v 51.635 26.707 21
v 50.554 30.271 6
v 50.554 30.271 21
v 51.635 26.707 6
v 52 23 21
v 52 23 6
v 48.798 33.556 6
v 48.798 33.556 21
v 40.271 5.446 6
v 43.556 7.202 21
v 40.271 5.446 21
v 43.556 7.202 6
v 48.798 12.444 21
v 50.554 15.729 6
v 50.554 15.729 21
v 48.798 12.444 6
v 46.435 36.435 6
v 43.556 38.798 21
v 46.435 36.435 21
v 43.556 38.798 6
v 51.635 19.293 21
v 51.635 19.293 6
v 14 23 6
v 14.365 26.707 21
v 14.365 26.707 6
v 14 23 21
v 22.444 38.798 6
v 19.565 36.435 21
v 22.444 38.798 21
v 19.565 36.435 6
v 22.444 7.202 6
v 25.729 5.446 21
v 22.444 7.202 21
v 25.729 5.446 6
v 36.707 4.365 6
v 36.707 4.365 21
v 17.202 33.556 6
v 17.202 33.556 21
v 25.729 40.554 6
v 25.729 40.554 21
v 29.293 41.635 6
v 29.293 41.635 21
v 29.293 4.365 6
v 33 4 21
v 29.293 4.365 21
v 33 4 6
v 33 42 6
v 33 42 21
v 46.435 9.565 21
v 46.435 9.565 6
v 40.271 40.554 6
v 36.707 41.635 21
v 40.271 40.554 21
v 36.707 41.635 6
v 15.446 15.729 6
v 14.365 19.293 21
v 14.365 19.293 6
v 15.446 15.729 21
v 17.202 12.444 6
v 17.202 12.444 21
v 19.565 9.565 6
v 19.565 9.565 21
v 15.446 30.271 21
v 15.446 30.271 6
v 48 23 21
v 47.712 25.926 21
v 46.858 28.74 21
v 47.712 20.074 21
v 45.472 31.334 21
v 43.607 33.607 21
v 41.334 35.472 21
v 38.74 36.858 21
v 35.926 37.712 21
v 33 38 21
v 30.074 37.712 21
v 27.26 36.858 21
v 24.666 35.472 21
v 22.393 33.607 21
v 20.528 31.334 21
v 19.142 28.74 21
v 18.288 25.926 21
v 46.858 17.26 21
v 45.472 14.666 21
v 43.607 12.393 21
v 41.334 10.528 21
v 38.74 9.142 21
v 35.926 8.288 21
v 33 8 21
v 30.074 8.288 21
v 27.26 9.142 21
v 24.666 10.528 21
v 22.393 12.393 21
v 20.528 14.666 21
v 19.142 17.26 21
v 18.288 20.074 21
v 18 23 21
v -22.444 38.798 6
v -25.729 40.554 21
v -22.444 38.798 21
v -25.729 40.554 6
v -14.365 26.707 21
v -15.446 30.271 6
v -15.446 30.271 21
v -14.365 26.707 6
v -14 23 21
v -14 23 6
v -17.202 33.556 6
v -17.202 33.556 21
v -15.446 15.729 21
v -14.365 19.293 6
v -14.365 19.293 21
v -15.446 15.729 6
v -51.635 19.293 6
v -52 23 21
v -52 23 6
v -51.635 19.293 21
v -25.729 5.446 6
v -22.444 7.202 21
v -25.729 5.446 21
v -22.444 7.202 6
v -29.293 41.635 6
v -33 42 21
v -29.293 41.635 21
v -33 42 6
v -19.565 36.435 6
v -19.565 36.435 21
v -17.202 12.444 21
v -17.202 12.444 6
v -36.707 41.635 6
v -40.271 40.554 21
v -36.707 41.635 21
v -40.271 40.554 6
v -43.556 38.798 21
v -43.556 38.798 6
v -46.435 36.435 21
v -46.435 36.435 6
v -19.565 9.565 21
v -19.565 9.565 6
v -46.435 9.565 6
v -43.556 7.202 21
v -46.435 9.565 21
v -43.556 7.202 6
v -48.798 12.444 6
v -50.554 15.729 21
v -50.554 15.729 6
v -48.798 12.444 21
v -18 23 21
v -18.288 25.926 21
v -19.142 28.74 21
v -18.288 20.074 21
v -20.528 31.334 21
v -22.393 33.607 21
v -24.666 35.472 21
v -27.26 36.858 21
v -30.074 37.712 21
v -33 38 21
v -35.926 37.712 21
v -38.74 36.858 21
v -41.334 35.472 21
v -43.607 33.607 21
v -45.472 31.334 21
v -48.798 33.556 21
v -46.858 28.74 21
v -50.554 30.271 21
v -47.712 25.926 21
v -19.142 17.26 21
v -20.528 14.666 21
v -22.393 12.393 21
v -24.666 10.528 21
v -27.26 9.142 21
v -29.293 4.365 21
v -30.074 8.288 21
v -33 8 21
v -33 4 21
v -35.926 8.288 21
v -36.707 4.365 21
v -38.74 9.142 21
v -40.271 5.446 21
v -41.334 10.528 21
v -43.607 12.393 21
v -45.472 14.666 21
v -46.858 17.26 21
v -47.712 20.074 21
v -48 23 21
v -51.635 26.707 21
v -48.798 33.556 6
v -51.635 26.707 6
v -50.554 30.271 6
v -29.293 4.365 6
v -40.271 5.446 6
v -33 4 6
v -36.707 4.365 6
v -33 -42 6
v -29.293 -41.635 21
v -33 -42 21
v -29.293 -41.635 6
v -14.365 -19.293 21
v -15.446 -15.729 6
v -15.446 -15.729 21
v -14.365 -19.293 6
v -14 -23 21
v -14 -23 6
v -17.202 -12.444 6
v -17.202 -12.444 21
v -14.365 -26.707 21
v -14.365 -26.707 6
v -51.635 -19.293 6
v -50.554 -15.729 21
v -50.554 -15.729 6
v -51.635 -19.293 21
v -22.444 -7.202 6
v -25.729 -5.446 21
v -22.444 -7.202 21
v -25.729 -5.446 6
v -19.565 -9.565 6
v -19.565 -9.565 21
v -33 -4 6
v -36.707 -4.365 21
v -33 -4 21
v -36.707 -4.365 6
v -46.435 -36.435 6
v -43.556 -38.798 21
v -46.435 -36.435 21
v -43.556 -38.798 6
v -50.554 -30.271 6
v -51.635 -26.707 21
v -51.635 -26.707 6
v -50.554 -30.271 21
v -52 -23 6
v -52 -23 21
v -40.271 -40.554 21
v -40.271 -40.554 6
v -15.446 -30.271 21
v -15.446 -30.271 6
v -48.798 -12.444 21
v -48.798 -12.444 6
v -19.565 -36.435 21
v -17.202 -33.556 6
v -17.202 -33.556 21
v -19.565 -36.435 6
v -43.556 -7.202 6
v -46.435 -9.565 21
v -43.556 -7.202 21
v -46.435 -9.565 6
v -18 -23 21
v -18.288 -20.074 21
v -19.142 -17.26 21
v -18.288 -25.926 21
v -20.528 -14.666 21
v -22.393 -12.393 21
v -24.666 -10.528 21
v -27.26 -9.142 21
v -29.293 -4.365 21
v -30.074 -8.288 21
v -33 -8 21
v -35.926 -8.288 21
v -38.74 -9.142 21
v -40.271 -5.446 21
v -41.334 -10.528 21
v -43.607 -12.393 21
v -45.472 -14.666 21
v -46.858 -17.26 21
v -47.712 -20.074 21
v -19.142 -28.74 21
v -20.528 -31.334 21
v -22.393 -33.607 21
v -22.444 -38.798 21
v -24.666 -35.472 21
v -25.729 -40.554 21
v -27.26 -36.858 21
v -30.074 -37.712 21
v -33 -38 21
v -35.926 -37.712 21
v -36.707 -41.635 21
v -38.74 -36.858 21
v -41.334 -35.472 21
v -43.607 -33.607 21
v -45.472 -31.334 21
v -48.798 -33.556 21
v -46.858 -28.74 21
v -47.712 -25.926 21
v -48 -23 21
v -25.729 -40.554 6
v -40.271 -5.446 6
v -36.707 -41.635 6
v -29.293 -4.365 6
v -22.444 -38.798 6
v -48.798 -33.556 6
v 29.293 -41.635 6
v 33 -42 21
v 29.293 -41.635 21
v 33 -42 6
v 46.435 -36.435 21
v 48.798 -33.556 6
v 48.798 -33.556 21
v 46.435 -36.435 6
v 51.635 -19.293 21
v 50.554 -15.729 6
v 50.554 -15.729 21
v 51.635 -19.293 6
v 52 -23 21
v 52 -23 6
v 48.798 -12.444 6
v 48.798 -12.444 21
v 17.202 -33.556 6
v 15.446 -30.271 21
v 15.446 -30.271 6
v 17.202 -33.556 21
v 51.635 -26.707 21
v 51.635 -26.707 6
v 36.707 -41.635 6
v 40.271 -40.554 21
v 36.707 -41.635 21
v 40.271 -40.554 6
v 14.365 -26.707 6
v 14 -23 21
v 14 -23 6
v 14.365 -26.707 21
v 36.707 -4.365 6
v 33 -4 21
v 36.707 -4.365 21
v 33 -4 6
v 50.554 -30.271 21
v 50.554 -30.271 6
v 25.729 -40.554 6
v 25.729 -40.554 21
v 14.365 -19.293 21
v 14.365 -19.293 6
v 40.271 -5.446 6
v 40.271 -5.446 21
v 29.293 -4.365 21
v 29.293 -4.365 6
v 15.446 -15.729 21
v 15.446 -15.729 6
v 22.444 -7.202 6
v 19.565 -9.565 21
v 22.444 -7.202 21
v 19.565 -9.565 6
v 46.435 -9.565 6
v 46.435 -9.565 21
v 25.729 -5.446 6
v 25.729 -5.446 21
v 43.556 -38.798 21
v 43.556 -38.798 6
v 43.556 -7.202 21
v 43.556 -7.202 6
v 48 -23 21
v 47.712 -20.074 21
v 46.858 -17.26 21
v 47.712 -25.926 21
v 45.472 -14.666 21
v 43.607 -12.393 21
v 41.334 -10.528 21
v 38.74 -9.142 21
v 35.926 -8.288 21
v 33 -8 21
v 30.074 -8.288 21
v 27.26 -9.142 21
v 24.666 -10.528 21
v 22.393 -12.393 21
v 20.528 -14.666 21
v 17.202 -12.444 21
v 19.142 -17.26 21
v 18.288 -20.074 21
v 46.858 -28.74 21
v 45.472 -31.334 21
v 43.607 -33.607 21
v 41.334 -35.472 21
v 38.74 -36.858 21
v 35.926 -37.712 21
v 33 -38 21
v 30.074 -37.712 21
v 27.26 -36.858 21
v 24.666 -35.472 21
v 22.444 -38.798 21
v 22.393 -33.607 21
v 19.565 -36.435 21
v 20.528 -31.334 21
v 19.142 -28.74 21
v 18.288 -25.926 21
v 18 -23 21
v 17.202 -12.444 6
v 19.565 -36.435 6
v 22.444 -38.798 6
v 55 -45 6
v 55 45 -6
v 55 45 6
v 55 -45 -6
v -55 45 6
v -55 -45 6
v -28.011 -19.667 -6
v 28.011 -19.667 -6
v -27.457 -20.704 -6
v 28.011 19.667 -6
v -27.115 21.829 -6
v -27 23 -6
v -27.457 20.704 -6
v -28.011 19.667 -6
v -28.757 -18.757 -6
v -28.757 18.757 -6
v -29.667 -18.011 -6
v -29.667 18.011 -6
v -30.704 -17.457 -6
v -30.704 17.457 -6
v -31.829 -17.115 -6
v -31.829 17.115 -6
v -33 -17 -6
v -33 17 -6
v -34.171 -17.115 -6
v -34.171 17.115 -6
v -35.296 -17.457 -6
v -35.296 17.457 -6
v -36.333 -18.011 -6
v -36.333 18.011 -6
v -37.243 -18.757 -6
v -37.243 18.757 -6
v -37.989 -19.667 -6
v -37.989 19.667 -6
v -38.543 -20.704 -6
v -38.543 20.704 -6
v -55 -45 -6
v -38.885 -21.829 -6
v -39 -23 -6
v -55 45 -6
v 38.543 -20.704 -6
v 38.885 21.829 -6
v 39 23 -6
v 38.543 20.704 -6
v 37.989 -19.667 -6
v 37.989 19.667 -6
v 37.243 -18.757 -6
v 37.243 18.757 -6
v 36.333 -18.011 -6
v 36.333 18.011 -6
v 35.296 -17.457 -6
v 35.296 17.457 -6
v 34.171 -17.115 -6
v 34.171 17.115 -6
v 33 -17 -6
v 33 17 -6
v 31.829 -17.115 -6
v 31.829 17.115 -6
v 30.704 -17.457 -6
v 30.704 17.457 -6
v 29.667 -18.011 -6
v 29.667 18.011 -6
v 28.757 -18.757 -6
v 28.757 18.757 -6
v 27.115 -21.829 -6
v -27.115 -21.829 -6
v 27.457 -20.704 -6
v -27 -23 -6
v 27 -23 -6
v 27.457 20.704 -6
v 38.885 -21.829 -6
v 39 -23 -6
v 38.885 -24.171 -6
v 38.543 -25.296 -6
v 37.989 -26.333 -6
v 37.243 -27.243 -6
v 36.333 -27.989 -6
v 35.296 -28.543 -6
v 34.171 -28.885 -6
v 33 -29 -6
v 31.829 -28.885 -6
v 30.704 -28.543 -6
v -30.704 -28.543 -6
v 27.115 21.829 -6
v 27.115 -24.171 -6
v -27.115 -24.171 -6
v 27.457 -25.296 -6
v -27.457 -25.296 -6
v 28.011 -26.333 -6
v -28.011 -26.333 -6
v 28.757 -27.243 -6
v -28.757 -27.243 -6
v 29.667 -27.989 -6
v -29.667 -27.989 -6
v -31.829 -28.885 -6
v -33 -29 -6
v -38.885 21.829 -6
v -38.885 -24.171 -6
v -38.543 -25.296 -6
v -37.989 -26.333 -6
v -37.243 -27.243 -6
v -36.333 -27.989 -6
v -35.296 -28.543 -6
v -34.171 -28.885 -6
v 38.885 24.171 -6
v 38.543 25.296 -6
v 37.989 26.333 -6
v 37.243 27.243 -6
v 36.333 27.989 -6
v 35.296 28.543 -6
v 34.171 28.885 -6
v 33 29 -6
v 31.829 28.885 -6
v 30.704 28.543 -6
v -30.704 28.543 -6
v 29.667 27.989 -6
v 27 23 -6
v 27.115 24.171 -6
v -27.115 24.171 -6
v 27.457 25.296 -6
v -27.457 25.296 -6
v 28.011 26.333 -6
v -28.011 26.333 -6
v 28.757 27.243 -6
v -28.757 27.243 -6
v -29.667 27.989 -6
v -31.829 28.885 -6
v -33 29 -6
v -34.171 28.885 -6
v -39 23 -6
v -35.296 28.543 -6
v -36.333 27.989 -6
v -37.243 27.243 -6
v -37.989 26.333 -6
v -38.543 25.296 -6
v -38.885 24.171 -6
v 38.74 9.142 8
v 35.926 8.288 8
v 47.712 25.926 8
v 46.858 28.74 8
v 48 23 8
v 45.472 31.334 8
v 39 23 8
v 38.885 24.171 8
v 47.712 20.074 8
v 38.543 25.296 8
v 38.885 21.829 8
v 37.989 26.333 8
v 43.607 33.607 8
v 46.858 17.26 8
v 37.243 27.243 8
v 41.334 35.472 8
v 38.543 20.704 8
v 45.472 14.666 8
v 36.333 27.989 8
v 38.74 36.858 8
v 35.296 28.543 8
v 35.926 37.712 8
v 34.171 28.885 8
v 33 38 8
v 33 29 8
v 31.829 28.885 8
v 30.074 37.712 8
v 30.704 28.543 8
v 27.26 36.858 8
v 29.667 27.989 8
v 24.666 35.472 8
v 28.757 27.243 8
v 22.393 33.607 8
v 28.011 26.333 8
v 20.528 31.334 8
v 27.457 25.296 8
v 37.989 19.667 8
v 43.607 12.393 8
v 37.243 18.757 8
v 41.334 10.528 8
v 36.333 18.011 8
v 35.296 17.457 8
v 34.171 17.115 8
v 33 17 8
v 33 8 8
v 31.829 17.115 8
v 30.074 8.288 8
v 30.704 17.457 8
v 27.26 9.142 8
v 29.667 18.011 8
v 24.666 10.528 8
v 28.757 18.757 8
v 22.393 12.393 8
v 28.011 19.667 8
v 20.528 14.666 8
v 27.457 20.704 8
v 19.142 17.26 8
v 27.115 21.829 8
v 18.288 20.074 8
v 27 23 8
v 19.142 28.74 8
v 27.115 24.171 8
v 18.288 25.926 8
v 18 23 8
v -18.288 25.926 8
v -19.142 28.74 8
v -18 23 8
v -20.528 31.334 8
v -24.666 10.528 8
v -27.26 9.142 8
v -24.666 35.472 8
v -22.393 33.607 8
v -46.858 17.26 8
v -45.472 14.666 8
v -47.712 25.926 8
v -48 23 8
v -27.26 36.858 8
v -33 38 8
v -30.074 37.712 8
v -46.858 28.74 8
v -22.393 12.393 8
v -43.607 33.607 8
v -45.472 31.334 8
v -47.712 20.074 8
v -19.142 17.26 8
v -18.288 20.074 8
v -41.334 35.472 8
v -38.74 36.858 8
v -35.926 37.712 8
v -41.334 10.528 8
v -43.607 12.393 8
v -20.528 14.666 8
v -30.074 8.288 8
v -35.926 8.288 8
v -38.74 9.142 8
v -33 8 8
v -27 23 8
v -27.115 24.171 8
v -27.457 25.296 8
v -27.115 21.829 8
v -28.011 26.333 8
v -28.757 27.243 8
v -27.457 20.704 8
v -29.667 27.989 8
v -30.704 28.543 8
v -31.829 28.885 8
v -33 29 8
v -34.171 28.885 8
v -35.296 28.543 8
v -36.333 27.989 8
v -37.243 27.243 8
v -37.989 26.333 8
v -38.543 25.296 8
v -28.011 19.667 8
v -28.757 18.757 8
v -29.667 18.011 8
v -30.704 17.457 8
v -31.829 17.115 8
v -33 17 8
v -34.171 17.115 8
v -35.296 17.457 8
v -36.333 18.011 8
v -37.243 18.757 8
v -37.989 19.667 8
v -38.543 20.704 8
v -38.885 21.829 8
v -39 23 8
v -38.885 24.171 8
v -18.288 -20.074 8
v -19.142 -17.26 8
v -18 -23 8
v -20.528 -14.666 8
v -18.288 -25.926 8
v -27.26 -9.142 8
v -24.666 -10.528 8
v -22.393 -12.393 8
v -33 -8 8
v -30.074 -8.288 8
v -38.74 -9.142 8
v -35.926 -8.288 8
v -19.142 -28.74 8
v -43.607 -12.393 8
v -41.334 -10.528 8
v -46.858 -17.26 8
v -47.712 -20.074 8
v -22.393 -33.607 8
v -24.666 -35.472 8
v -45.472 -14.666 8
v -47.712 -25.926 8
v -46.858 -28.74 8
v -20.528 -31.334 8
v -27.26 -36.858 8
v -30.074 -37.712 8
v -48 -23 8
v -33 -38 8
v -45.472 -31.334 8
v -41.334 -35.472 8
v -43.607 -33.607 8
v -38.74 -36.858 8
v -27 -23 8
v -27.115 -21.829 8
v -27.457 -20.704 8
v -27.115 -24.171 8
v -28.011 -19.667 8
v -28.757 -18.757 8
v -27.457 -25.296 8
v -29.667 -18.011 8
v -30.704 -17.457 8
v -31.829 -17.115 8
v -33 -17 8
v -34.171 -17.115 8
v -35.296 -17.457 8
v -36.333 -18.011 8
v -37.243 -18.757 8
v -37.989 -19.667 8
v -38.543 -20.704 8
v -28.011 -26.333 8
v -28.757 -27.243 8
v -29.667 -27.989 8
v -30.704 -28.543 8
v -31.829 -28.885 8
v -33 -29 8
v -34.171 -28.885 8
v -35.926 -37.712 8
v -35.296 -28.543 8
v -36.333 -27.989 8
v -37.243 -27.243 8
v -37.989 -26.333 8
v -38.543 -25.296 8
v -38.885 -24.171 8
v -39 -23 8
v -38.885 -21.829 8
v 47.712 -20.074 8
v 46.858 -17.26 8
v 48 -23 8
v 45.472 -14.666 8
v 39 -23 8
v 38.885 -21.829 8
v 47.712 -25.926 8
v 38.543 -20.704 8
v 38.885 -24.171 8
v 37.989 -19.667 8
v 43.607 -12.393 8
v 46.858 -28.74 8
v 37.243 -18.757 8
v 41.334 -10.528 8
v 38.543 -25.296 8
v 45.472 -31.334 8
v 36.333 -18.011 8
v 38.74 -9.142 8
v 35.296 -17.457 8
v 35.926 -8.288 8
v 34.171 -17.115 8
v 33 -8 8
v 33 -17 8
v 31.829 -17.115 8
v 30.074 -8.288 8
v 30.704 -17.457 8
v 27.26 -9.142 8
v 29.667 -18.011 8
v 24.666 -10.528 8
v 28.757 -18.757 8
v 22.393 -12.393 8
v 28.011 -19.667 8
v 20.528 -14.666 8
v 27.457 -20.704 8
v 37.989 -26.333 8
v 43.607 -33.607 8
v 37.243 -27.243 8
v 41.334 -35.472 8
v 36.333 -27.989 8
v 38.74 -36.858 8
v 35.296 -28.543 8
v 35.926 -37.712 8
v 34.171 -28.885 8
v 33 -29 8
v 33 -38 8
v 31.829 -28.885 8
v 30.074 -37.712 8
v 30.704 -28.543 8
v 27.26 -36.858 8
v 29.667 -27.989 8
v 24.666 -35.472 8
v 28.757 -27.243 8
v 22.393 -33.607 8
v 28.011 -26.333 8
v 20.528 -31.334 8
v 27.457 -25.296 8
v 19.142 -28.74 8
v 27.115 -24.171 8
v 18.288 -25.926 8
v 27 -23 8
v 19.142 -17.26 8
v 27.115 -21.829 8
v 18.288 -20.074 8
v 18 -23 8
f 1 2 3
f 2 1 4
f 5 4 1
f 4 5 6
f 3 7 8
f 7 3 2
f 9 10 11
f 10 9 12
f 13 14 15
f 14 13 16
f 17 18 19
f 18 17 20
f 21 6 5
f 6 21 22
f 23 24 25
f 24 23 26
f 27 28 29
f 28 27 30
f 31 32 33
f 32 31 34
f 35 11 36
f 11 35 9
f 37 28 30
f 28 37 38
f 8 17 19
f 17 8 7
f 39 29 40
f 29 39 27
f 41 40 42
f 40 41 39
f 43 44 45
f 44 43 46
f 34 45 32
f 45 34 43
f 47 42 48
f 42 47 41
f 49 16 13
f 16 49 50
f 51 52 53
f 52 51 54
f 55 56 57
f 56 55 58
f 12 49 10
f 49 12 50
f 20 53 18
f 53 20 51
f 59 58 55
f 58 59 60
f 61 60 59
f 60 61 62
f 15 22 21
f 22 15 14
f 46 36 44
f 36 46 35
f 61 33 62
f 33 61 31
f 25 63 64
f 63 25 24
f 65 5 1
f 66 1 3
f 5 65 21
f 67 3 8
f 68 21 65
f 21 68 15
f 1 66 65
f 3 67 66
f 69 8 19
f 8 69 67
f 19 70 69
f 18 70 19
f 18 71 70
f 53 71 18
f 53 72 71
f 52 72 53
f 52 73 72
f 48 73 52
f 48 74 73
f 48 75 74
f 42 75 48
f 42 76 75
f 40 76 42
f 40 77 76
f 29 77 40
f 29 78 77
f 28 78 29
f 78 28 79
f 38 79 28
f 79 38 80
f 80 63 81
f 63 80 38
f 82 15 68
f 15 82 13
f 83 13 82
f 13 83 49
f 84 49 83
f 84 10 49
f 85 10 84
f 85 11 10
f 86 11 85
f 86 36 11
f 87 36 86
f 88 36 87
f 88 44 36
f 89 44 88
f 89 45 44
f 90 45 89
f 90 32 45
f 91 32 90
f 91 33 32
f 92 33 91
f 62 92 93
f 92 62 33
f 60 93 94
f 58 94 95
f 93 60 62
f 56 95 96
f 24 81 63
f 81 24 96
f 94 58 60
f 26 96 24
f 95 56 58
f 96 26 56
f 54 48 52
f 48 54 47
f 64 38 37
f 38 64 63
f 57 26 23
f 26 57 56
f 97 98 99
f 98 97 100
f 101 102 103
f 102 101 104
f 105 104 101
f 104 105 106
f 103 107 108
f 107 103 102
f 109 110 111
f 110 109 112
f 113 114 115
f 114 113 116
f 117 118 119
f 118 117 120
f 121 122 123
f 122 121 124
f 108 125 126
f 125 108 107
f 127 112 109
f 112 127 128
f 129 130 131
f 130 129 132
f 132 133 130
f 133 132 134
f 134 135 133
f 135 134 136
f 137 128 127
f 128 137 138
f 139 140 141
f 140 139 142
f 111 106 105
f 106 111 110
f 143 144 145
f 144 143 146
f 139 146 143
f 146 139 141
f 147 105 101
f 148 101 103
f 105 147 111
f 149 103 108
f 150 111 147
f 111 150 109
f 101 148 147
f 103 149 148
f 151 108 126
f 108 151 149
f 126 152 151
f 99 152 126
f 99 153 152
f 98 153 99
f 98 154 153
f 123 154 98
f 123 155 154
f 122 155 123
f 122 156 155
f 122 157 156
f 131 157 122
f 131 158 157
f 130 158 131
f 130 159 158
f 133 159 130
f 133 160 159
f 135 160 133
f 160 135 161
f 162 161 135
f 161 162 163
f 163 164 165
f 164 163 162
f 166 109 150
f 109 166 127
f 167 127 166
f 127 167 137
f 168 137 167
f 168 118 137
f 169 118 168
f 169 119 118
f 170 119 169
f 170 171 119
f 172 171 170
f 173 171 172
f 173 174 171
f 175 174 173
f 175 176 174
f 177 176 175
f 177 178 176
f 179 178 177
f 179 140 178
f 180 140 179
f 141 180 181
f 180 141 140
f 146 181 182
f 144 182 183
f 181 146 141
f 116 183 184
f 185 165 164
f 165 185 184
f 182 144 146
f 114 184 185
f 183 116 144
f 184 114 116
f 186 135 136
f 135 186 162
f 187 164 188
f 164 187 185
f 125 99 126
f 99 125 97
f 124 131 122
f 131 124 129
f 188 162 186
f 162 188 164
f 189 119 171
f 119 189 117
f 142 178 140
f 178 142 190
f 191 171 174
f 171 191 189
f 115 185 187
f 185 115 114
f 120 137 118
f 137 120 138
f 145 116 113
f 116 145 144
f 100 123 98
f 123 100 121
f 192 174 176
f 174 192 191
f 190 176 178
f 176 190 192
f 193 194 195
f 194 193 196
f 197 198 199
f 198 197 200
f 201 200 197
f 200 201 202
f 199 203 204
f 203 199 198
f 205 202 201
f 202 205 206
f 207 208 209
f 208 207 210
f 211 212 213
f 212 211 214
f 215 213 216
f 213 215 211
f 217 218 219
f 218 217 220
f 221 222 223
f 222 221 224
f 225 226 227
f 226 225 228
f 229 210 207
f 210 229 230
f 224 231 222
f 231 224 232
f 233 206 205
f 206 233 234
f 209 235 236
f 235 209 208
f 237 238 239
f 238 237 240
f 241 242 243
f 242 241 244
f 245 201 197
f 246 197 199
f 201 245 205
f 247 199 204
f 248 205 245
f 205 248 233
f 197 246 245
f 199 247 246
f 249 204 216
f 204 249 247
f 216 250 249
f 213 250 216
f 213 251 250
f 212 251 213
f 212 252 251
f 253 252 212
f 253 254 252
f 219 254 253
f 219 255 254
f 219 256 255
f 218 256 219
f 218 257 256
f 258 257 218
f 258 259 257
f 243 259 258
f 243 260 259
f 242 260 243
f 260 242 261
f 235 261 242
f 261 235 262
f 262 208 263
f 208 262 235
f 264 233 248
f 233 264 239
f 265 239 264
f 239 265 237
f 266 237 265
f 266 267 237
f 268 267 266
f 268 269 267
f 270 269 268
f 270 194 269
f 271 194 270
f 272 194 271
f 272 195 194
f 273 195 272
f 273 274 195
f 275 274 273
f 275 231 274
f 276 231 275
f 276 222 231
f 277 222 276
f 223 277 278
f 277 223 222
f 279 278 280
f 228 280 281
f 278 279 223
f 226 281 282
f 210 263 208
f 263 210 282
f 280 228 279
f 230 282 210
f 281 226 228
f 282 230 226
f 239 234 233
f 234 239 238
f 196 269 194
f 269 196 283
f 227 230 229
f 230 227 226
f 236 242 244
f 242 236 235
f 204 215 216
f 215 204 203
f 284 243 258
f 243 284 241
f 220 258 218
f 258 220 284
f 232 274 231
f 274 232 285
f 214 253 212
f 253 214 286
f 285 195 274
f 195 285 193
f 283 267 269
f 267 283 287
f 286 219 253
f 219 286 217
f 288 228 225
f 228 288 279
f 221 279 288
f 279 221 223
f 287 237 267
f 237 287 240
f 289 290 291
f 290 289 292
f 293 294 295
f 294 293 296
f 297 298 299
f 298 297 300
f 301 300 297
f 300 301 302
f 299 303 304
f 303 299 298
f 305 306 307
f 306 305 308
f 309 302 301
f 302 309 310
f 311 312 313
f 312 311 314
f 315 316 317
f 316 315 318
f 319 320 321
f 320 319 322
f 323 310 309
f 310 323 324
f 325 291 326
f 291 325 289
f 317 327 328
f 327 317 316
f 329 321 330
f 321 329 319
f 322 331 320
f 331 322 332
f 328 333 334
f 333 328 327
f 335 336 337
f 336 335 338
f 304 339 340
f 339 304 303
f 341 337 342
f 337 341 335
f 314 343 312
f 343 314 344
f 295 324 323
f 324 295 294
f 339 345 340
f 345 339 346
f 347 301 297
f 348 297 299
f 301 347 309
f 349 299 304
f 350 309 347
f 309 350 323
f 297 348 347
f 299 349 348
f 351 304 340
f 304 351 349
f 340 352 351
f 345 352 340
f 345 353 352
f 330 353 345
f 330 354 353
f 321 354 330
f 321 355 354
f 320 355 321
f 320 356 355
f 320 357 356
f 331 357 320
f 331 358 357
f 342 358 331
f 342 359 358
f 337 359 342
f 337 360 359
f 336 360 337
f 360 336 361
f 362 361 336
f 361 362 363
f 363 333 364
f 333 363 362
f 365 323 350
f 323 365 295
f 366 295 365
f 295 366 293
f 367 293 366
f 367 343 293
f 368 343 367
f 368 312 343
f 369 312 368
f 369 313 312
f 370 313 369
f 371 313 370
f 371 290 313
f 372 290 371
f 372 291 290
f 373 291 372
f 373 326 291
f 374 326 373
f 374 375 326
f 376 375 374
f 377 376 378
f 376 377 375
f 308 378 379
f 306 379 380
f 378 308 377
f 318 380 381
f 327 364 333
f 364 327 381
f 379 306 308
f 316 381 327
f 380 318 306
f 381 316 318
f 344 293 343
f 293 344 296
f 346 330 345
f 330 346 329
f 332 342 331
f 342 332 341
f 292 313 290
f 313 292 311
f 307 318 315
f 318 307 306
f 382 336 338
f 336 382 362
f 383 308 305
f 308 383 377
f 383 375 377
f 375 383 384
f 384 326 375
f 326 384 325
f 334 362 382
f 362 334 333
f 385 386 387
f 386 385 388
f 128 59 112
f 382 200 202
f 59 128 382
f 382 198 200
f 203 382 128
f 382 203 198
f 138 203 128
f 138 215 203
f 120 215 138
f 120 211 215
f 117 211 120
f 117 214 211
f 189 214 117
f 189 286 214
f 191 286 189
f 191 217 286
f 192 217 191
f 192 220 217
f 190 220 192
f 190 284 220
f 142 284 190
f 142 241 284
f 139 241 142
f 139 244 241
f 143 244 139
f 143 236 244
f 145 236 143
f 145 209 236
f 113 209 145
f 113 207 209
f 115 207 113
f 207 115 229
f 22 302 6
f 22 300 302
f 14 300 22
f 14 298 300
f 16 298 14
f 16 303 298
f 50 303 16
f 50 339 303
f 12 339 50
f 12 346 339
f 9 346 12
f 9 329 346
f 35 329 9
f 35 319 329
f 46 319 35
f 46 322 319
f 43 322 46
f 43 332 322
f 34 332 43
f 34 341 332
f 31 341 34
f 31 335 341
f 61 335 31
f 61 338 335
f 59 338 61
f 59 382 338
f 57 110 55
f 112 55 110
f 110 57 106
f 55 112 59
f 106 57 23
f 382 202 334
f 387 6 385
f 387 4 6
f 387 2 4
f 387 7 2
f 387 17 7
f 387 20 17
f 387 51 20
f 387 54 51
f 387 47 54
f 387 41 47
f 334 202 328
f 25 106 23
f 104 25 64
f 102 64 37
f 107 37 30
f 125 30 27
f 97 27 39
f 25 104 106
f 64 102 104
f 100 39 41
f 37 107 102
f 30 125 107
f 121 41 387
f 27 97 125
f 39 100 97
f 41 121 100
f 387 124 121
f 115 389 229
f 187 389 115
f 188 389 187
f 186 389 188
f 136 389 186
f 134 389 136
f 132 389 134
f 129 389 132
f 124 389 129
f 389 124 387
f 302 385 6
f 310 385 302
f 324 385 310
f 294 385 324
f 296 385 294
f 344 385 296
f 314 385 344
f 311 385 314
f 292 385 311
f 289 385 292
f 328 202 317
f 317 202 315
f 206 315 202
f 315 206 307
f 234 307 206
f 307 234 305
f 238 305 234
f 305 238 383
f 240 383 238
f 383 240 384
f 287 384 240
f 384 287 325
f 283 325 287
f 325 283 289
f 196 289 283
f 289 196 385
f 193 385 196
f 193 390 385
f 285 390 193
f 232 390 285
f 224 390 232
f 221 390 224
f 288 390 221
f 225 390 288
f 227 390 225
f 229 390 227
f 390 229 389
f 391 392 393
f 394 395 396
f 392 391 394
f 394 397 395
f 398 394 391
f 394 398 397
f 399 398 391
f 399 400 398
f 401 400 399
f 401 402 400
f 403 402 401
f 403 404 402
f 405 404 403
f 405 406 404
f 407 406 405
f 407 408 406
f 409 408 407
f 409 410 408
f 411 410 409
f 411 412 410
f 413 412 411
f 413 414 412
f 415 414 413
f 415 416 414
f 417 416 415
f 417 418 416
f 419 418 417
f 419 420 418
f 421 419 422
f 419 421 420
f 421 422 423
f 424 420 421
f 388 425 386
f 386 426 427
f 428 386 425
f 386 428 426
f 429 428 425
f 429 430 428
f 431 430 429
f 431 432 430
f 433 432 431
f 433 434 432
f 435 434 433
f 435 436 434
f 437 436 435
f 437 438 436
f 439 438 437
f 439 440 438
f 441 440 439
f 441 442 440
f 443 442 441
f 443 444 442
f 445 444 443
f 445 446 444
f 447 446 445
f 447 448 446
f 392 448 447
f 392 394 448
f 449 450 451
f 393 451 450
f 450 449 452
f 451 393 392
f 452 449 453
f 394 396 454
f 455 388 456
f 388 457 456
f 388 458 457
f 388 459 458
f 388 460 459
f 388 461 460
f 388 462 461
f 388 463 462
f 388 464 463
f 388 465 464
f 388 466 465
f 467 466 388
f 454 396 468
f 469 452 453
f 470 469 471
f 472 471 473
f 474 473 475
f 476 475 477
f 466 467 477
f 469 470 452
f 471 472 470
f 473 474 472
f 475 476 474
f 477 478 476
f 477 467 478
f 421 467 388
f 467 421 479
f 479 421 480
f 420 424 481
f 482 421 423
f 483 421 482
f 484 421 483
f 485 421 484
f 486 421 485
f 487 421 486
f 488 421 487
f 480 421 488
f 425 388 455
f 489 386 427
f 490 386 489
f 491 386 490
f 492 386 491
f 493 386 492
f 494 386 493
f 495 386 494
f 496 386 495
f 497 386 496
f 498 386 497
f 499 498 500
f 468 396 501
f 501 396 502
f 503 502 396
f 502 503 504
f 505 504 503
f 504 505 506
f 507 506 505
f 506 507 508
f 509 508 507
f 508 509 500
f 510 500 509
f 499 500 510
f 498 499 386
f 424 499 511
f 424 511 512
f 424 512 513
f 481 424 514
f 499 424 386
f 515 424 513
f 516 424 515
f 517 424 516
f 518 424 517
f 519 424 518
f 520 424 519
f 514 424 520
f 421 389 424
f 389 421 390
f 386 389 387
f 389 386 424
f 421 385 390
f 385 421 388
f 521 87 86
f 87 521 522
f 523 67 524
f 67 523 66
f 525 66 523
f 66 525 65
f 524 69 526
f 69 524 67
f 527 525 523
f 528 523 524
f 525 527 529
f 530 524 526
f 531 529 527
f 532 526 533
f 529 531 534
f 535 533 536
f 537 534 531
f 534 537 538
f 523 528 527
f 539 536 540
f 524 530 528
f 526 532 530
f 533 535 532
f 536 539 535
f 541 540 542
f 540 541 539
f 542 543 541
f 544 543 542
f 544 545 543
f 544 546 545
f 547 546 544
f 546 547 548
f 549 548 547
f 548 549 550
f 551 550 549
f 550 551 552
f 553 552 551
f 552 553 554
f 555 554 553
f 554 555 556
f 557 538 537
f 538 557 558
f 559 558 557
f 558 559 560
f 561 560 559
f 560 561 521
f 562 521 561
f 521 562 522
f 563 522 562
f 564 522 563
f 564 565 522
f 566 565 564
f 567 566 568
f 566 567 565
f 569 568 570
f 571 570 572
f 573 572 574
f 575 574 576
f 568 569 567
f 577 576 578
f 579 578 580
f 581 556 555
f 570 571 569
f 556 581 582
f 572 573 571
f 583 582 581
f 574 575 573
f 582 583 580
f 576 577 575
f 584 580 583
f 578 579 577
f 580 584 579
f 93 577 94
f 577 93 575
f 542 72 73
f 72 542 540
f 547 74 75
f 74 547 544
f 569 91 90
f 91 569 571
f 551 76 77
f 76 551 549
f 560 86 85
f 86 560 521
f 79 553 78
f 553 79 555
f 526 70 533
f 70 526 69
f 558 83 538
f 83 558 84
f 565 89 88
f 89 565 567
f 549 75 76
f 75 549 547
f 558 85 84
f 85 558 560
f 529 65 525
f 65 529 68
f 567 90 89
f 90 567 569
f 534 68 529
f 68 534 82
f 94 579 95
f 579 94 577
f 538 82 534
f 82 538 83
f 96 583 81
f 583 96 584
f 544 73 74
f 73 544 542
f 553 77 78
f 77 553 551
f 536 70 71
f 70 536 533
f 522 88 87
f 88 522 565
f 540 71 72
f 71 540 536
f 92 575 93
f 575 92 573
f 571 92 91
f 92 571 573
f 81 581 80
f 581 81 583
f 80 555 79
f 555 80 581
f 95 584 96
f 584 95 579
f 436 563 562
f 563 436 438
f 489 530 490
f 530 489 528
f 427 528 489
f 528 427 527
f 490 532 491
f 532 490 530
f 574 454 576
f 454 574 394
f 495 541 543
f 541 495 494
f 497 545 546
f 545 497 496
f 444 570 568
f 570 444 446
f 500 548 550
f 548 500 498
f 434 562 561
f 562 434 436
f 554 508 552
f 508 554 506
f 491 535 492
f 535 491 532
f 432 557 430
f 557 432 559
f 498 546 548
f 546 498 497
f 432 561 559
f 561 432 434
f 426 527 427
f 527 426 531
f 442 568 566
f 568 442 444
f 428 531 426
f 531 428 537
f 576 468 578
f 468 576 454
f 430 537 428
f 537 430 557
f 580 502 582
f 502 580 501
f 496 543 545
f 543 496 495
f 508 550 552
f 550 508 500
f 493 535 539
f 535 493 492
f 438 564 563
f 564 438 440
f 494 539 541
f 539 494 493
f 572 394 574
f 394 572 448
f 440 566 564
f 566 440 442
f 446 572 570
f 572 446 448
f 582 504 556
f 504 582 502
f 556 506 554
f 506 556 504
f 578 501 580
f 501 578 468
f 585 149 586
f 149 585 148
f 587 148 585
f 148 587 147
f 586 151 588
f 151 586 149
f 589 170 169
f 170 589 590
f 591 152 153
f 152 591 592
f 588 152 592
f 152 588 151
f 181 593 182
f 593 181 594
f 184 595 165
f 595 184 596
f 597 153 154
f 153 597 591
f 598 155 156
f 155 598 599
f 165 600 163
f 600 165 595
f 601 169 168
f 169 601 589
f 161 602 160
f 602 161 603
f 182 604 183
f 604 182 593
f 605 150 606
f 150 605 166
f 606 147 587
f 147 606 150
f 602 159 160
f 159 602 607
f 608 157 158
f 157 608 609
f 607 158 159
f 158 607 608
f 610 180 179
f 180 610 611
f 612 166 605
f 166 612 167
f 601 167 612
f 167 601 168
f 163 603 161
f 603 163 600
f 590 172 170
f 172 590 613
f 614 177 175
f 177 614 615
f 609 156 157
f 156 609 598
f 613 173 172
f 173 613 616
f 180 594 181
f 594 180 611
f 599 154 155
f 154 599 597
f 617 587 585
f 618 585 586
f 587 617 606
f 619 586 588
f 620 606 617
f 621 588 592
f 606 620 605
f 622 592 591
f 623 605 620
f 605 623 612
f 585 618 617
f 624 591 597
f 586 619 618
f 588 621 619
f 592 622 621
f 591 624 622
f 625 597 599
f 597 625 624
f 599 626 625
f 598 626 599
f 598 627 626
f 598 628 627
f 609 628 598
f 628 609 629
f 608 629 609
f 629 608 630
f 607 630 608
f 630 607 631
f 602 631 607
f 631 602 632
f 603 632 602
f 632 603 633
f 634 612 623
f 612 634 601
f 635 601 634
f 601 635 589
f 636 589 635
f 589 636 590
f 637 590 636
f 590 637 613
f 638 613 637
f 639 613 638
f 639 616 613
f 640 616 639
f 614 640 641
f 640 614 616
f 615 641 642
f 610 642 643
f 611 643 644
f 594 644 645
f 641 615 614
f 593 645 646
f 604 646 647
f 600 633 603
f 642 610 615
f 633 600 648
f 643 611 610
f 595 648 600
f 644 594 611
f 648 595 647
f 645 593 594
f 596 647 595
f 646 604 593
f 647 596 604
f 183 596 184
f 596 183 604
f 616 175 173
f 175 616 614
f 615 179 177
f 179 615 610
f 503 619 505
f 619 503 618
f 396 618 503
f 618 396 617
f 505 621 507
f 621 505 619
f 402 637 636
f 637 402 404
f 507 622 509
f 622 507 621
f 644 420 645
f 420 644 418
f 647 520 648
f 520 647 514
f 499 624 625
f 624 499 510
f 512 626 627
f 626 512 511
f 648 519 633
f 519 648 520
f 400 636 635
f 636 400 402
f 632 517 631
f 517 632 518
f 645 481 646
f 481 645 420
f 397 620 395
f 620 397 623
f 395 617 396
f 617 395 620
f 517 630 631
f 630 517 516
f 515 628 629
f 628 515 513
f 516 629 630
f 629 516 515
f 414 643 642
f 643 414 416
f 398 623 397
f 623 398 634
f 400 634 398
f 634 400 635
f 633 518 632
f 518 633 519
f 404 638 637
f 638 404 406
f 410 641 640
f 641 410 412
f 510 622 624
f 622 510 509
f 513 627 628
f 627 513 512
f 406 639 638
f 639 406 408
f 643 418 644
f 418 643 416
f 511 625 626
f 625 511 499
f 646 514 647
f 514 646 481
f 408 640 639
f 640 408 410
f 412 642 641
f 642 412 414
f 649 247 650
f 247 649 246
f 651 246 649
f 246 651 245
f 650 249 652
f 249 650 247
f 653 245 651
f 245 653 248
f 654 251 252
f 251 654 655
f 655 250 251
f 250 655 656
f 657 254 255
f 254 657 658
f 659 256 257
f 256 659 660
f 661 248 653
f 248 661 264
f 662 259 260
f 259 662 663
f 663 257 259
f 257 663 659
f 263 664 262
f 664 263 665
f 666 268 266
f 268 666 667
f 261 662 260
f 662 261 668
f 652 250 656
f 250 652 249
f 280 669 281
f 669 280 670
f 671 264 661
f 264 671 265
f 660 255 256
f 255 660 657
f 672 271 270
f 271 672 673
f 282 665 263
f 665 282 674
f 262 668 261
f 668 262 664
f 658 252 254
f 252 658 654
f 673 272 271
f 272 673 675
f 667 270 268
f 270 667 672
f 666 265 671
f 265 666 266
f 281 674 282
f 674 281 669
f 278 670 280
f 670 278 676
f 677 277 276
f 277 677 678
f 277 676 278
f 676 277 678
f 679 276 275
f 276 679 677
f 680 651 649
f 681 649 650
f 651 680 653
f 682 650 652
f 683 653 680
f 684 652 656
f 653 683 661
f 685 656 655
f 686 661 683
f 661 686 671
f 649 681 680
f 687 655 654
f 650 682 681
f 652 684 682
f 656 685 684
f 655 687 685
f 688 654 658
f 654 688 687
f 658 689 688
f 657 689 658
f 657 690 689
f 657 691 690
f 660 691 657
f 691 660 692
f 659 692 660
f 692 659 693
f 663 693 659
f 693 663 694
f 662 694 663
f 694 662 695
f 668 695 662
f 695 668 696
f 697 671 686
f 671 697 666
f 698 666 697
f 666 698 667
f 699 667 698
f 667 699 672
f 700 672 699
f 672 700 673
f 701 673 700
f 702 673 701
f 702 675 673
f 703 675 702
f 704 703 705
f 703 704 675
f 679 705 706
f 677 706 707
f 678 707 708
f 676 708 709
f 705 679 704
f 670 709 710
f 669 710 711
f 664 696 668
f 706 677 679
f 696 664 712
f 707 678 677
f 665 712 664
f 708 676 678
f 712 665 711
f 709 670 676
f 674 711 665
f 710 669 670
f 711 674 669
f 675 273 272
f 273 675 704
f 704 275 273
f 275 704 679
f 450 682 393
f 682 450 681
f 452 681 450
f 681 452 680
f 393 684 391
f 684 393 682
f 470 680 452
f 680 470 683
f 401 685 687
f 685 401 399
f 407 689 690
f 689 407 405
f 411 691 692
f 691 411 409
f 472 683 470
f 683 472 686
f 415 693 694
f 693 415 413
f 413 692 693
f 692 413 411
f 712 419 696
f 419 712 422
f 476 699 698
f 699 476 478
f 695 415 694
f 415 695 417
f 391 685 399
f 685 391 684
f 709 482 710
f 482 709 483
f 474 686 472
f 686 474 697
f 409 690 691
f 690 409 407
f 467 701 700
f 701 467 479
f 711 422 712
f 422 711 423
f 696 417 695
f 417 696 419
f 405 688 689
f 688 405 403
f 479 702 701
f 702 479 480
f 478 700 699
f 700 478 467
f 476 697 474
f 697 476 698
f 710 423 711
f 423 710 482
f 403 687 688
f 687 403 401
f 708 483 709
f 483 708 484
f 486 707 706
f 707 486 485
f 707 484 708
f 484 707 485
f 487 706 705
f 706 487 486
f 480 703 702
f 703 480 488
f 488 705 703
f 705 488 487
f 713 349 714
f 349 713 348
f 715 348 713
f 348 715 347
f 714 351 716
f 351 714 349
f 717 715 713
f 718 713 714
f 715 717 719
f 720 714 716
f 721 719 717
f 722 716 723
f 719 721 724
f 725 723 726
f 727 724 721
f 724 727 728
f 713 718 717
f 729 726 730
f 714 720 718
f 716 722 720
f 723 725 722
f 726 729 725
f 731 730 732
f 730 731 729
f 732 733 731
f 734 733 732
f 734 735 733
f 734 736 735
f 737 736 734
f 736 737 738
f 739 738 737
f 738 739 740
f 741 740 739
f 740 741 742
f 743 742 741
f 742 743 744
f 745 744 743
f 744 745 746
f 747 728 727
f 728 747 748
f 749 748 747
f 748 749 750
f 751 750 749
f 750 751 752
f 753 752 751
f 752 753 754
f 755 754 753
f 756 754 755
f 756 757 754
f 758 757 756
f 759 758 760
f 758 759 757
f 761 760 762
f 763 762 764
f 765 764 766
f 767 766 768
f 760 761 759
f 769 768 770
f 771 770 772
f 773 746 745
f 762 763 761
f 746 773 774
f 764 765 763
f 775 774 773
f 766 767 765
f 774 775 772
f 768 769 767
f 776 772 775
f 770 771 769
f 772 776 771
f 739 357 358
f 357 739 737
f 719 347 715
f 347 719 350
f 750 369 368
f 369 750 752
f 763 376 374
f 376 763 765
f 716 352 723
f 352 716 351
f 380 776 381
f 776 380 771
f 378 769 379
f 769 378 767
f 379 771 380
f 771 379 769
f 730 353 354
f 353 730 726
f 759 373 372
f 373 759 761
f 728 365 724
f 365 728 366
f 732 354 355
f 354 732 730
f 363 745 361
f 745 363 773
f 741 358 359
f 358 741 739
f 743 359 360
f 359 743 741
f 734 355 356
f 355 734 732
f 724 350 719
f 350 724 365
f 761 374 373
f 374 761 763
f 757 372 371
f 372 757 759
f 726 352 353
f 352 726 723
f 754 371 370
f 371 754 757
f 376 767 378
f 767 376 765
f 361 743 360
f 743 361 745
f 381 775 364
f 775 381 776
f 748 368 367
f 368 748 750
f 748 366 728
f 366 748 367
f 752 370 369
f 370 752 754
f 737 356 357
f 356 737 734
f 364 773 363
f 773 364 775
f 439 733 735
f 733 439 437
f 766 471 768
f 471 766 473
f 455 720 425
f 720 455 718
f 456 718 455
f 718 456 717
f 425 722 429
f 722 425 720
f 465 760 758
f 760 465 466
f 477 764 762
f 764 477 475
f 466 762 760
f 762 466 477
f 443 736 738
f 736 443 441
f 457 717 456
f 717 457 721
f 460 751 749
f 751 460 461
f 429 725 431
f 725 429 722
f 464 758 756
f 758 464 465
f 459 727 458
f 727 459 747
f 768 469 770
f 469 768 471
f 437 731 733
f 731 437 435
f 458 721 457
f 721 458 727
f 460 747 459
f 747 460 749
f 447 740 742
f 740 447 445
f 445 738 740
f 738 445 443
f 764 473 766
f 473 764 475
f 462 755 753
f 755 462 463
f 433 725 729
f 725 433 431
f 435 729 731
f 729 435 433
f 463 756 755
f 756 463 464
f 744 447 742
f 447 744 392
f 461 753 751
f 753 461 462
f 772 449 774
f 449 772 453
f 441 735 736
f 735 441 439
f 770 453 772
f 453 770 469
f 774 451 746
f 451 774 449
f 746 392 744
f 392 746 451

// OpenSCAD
$fn = 32;

// ----------------------------------------------------------------------
// Socket pad plate
// bosses with counterbored sockets for the screws
// ----------------------------------------------------------------------

// --- parameters (mm) ---
base_t = 12;            // base plate thickness
boss_h = 15;            // boss height above the base plate
boss_d = 38;            // boss diameter
socket_d = 30;          // socket diameter
socket_depth = 13;      // socket depth from the boss face
bolt_d = 12;            // screw clearance hole through the socket floor
plate = [110, 90, 12];  // overall size (x, y, z)
edge = 22;              // boss centre offset from the plate edge
pads = 4;               // boss count, one per corner

// --- derived feature positions (mm) ---
height = base_t + boss_h;        // = 27   overall height of the part
corner_x = plate[0] / 2 - edge;  // = 33   boss centre X
corner_y = plate[1] / 2 - edge;  // = 23   boss centre Y
feature_centers = [
  [corner_x, corner_y],
  [-corner_x, corner_y],
  [-corner_x, -corner_y],
  [corner_x, -corner_y]
];   // boss centres: sockets, holes and the pads themselves are placed from here

// base plate, bosses on feature_centers, socket + through hole in each
difference() {
  union() {
    cube(plate, center = true);
    for (centre = feature_centers)
      translate([centre[0], centre[1], plate[2] / 2 - 1])
        cylinder(d = boss_d, h = boss_h + 1);
  }
  for (centre = feature_centers) {
    translate([centre[0], centre[1], plate[2] / 2 + boss_h - socket_depth])
      cylinder(d = socket_d, h = socket_depth + 1);
    translate([centre[0], centre[1], -height])
      cylinder(d = bolt_d, h = 2 * height + 2);  // through the socket floor
  }
}
